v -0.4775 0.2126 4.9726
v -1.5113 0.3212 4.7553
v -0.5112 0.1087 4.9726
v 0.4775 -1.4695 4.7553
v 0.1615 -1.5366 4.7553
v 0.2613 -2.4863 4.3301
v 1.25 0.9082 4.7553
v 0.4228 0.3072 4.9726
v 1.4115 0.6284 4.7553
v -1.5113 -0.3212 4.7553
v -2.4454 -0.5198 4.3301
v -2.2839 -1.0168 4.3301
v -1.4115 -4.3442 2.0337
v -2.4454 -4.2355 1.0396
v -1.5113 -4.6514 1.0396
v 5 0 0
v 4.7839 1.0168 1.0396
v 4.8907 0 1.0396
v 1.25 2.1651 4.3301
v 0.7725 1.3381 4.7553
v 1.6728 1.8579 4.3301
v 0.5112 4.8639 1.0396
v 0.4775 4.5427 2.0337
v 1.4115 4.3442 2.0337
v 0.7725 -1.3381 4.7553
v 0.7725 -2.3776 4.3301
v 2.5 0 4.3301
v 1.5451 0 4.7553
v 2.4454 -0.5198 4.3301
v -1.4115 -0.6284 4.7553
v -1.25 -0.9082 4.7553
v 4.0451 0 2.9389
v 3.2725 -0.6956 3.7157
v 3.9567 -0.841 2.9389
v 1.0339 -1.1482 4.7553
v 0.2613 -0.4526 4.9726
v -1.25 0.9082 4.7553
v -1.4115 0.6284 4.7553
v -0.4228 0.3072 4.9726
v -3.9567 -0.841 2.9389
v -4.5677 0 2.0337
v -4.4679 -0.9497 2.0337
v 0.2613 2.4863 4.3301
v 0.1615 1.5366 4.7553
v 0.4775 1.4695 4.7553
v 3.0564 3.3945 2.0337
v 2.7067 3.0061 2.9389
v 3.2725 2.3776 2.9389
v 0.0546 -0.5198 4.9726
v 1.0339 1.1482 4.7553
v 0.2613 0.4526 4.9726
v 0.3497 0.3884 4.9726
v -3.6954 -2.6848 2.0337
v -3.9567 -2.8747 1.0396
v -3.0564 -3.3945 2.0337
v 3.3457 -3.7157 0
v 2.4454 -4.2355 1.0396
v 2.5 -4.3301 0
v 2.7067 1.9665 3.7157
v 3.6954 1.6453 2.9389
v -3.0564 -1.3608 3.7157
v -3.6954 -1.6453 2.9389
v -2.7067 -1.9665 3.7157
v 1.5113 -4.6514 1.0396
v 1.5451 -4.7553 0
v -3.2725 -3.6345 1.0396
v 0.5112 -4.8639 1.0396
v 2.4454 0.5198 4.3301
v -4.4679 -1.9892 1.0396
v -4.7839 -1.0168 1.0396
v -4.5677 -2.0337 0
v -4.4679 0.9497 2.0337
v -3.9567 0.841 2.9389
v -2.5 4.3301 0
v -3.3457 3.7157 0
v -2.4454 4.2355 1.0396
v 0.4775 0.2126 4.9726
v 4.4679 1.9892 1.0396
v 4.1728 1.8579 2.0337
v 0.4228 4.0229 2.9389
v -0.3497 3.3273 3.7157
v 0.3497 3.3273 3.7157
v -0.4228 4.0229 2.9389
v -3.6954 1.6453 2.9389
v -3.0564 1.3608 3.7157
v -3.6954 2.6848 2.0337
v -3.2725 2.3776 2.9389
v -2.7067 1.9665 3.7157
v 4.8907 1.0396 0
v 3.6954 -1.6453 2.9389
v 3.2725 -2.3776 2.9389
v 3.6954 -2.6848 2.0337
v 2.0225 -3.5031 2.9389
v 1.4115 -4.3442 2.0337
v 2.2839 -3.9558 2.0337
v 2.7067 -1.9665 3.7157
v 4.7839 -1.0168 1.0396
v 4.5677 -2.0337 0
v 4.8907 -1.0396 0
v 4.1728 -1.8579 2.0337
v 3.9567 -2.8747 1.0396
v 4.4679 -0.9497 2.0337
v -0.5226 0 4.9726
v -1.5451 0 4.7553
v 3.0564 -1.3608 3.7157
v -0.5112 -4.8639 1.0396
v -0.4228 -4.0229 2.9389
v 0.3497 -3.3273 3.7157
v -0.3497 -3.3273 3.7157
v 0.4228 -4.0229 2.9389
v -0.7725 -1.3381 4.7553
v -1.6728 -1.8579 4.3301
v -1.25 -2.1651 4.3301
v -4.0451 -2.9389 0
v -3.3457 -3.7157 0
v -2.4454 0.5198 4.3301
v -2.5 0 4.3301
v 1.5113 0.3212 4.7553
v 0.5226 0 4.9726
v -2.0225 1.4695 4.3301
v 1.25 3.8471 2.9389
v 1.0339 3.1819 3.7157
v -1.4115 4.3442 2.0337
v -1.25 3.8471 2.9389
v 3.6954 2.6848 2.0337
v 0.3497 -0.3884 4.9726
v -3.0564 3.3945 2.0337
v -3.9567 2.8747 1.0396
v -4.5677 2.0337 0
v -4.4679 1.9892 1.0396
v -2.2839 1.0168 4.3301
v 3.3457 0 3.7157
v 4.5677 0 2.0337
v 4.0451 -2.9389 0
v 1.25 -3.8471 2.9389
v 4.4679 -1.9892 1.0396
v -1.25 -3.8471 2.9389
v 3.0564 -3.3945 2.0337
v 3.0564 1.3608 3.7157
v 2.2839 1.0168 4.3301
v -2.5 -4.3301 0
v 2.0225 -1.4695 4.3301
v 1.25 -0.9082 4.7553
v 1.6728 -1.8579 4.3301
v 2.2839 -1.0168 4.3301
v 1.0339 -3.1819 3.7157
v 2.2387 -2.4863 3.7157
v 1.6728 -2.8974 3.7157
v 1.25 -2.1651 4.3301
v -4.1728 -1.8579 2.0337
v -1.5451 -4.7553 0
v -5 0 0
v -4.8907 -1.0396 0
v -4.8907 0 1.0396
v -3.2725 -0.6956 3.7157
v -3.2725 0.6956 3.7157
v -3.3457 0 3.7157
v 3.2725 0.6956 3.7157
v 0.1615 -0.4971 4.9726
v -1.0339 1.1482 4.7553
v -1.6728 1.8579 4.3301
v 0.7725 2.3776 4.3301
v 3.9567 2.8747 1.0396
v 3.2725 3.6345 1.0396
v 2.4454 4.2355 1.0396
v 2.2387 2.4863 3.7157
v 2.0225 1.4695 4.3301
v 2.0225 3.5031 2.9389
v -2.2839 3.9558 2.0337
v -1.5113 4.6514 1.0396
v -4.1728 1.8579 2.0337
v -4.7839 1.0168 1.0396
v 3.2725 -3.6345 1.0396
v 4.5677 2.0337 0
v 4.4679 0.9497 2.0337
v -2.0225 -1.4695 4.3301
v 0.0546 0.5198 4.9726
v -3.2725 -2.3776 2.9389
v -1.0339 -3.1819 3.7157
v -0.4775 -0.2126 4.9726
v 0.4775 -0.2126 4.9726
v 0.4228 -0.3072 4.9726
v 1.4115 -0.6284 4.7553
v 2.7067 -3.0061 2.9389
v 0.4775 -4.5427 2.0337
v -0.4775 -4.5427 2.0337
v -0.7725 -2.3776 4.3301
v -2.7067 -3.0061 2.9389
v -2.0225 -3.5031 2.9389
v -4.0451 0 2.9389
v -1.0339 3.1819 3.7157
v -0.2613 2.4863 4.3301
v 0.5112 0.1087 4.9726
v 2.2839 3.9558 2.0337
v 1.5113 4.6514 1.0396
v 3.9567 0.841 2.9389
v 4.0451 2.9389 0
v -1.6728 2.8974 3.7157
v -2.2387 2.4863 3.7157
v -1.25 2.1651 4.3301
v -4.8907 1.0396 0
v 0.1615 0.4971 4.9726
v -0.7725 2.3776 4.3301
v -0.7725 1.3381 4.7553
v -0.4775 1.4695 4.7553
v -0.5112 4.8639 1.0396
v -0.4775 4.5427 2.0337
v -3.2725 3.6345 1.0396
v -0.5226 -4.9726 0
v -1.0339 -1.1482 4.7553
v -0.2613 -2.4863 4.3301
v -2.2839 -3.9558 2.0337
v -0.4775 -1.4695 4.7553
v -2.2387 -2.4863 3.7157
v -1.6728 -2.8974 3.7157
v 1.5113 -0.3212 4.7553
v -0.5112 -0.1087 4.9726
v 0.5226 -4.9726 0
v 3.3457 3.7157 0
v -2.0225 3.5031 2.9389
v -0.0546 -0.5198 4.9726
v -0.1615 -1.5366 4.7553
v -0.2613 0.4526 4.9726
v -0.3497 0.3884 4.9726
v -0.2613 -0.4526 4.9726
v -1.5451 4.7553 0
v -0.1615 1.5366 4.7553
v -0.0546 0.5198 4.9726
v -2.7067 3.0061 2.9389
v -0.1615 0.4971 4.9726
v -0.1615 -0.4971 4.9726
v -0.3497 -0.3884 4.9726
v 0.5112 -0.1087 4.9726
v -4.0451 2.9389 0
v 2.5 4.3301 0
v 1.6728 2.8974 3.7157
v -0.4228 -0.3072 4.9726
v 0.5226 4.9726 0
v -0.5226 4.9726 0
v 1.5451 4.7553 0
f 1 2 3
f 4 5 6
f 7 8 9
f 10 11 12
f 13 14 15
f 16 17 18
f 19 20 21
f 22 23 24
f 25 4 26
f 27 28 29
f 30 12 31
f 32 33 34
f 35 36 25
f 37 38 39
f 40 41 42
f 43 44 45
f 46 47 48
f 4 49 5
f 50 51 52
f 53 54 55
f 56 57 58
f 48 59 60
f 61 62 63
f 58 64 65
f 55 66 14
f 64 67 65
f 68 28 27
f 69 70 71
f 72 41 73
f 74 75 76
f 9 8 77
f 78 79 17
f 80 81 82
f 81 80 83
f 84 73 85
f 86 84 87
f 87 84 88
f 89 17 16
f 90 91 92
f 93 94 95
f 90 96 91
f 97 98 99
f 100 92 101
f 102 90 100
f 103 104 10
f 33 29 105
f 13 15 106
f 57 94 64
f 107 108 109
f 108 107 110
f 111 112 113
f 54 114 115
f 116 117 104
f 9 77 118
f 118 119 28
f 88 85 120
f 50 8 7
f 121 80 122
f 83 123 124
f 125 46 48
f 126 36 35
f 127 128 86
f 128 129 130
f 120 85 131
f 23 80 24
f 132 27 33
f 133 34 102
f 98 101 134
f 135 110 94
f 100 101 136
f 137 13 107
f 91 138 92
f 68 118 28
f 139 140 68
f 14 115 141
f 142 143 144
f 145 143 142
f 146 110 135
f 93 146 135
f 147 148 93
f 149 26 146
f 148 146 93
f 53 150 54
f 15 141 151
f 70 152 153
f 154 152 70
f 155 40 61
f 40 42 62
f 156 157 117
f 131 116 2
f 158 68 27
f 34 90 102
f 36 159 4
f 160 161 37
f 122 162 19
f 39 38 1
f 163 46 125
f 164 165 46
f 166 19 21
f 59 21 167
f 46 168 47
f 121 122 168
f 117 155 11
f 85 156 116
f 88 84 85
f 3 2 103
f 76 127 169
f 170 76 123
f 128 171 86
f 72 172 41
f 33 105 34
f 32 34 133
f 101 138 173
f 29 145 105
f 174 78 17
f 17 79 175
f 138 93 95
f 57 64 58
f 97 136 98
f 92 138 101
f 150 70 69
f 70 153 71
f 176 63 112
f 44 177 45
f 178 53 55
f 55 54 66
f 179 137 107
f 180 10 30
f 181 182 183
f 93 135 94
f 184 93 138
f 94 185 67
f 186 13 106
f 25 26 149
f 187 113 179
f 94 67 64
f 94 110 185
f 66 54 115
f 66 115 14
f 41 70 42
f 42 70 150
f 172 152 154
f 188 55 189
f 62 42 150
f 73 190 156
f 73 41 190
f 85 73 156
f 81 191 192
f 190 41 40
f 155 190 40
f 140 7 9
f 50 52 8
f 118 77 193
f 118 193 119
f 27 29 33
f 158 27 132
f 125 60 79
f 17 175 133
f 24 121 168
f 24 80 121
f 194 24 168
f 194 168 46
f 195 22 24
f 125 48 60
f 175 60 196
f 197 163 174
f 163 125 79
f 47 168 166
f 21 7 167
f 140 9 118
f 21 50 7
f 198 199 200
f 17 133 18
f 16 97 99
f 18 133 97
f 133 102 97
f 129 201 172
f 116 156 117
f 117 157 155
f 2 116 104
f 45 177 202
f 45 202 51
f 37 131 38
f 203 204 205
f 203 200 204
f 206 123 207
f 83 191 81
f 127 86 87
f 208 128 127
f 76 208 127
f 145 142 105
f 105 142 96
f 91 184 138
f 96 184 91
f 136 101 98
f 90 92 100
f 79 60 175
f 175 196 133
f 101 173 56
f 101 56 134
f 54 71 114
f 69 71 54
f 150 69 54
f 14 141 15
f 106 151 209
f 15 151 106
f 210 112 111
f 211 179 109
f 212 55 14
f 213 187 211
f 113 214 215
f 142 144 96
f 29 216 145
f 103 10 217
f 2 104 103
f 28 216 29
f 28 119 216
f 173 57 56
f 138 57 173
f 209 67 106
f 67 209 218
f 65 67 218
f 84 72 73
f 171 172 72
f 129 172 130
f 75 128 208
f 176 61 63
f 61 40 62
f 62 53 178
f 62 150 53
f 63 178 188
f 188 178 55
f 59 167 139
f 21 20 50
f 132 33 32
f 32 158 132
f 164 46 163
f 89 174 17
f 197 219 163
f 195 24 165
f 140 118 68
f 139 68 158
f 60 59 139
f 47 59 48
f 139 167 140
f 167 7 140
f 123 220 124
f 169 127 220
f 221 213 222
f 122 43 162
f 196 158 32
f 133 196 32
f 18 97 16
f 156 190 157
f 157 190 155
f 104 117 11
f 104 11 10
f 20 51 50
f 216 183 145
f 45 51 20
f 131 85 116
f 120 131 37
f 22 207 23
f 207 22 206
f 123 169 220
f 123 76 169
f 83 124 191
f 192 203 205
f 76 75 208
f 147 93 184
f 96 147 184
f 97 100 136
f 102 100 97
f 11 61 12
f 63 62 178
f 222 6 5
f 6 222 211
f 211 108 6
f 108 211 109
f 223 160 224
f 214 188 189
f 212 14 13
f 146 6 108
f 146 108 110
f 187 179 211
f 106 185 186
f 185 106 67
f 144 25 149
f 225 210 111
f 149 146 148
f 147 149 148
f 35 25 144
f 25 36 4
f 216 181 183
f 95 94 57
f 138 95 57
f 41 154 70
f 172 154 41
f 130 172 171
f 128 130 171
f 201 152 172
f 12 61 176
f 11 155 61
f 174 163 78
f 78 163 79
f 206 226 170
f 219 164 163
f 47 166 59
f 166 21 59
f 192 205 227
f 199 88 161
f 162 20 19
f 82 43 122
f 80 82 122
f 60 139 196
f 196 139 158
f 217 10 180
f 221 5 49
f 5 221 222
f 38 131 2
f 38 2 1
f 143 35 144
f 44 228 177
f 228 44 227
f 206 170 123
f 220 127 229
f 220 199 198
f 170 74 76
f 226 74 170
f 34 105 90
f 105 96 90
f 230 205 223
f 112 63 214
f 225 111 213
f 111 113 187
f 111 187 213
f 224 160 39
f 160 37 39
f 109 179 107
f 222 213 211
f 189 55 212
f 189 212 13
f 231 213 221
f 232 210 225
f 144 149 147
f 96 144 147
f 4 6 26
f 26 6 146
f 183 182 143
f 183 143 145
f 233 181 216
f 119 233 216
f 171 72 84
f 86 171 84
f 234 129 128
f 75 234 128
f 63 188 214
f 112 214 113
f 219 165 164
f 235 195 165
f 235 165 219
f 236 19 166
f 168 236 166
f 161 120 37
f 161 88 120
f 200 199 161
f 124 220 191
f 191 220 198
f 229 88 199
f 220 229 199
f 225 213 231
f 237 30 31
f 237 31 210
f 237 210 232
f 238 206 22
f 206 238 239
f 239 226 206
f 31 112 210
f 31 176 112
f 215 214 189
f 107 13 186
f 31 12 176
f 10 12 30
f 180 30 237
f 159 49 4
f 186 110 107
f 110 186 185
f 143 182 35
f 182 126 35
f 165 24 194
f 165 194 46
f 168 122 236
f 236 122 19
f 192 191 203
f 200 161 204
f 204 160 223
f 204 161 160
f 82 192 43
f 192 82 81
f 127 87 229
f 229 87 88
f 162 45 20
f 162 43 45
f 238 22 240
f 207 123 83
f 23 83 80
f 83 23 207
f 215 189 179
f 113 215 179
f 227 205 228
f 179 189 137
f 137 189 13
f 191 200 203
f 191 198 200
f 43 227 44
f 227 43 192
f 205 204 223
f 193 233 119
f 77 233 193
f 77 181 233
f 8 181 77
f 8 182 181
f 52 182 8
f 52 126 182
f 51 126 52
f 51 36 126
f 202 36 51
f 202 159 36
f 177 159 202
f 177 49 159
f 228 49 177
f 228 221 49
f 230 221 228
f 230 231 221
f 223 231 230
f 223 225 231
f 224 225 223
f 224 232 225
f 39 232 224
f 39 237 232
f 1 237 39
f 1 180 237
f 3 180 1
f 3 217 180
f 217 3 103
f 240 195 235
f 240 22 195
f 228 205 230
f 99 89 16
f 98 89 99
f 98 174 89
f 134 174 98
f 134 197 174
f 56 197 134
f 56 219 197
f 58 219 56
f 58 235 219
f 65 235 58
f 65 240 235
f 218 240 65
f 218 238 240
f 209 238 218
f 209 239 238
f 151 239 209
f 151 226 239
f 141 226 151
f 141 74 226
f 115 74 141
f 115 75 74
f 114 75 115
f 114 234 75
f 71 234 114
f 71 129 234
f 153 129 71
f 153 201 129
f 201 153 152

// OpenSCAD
screw_points=[[43.5,6],[56.5,6],[43.5,36],[56.5,36],
              [22.5,68],[77.5,68],[6,85],[94,85],
              [35,115],[65,115]];
screw_m3_rad=2;
screw_m3_head_rad=3;
nut_m3_dia=5.5;

nuts=0;
$fn=30;

difference()
{
  /* minkowski of frame perimiter shrunk by 10mm in x and y and
   centered with a 5mm radius sphere. */
  minkowski()
  {
    linear_extrude(height=1) import("Tricopter_outer_-5mm.dxf");
    sphere(r=5);
  }
  // flat bottom
  translate([-10,-10,-10]) cube([120,150,10]);
  // holes
  for(point=screw_points)
  {
    translate([point[0],point[1],-1]) cylinder(r=screw_m3_rad, h=10);
    if(nuts==1)
    {
      translate([point[0],point[1],2]) nut(nut_m3_dia, 10);
    } else {
      translate([point[0],point[1],2]) cylinder(r=screw_m3_head_rad, h=10);
    }
  }
}

////for comparison
//translate([0,0,-1]) import("Tricopter.dxf");

module nut(d,h,horizontal=true)
{
  cornerdiameter =  (d / 2) / cos (180 / 6);
  cylinder(h = h, r = cornerdiameter, $fn = 6);
  if(horizontal)
  {
    for(i = [1:6])
    {
      rotate([0,0,60*i]) translate([-cornerdiameter-0.2,0,0]) rotate([0,0,-45]) cube([2,2,h]);
    }
  }
}
